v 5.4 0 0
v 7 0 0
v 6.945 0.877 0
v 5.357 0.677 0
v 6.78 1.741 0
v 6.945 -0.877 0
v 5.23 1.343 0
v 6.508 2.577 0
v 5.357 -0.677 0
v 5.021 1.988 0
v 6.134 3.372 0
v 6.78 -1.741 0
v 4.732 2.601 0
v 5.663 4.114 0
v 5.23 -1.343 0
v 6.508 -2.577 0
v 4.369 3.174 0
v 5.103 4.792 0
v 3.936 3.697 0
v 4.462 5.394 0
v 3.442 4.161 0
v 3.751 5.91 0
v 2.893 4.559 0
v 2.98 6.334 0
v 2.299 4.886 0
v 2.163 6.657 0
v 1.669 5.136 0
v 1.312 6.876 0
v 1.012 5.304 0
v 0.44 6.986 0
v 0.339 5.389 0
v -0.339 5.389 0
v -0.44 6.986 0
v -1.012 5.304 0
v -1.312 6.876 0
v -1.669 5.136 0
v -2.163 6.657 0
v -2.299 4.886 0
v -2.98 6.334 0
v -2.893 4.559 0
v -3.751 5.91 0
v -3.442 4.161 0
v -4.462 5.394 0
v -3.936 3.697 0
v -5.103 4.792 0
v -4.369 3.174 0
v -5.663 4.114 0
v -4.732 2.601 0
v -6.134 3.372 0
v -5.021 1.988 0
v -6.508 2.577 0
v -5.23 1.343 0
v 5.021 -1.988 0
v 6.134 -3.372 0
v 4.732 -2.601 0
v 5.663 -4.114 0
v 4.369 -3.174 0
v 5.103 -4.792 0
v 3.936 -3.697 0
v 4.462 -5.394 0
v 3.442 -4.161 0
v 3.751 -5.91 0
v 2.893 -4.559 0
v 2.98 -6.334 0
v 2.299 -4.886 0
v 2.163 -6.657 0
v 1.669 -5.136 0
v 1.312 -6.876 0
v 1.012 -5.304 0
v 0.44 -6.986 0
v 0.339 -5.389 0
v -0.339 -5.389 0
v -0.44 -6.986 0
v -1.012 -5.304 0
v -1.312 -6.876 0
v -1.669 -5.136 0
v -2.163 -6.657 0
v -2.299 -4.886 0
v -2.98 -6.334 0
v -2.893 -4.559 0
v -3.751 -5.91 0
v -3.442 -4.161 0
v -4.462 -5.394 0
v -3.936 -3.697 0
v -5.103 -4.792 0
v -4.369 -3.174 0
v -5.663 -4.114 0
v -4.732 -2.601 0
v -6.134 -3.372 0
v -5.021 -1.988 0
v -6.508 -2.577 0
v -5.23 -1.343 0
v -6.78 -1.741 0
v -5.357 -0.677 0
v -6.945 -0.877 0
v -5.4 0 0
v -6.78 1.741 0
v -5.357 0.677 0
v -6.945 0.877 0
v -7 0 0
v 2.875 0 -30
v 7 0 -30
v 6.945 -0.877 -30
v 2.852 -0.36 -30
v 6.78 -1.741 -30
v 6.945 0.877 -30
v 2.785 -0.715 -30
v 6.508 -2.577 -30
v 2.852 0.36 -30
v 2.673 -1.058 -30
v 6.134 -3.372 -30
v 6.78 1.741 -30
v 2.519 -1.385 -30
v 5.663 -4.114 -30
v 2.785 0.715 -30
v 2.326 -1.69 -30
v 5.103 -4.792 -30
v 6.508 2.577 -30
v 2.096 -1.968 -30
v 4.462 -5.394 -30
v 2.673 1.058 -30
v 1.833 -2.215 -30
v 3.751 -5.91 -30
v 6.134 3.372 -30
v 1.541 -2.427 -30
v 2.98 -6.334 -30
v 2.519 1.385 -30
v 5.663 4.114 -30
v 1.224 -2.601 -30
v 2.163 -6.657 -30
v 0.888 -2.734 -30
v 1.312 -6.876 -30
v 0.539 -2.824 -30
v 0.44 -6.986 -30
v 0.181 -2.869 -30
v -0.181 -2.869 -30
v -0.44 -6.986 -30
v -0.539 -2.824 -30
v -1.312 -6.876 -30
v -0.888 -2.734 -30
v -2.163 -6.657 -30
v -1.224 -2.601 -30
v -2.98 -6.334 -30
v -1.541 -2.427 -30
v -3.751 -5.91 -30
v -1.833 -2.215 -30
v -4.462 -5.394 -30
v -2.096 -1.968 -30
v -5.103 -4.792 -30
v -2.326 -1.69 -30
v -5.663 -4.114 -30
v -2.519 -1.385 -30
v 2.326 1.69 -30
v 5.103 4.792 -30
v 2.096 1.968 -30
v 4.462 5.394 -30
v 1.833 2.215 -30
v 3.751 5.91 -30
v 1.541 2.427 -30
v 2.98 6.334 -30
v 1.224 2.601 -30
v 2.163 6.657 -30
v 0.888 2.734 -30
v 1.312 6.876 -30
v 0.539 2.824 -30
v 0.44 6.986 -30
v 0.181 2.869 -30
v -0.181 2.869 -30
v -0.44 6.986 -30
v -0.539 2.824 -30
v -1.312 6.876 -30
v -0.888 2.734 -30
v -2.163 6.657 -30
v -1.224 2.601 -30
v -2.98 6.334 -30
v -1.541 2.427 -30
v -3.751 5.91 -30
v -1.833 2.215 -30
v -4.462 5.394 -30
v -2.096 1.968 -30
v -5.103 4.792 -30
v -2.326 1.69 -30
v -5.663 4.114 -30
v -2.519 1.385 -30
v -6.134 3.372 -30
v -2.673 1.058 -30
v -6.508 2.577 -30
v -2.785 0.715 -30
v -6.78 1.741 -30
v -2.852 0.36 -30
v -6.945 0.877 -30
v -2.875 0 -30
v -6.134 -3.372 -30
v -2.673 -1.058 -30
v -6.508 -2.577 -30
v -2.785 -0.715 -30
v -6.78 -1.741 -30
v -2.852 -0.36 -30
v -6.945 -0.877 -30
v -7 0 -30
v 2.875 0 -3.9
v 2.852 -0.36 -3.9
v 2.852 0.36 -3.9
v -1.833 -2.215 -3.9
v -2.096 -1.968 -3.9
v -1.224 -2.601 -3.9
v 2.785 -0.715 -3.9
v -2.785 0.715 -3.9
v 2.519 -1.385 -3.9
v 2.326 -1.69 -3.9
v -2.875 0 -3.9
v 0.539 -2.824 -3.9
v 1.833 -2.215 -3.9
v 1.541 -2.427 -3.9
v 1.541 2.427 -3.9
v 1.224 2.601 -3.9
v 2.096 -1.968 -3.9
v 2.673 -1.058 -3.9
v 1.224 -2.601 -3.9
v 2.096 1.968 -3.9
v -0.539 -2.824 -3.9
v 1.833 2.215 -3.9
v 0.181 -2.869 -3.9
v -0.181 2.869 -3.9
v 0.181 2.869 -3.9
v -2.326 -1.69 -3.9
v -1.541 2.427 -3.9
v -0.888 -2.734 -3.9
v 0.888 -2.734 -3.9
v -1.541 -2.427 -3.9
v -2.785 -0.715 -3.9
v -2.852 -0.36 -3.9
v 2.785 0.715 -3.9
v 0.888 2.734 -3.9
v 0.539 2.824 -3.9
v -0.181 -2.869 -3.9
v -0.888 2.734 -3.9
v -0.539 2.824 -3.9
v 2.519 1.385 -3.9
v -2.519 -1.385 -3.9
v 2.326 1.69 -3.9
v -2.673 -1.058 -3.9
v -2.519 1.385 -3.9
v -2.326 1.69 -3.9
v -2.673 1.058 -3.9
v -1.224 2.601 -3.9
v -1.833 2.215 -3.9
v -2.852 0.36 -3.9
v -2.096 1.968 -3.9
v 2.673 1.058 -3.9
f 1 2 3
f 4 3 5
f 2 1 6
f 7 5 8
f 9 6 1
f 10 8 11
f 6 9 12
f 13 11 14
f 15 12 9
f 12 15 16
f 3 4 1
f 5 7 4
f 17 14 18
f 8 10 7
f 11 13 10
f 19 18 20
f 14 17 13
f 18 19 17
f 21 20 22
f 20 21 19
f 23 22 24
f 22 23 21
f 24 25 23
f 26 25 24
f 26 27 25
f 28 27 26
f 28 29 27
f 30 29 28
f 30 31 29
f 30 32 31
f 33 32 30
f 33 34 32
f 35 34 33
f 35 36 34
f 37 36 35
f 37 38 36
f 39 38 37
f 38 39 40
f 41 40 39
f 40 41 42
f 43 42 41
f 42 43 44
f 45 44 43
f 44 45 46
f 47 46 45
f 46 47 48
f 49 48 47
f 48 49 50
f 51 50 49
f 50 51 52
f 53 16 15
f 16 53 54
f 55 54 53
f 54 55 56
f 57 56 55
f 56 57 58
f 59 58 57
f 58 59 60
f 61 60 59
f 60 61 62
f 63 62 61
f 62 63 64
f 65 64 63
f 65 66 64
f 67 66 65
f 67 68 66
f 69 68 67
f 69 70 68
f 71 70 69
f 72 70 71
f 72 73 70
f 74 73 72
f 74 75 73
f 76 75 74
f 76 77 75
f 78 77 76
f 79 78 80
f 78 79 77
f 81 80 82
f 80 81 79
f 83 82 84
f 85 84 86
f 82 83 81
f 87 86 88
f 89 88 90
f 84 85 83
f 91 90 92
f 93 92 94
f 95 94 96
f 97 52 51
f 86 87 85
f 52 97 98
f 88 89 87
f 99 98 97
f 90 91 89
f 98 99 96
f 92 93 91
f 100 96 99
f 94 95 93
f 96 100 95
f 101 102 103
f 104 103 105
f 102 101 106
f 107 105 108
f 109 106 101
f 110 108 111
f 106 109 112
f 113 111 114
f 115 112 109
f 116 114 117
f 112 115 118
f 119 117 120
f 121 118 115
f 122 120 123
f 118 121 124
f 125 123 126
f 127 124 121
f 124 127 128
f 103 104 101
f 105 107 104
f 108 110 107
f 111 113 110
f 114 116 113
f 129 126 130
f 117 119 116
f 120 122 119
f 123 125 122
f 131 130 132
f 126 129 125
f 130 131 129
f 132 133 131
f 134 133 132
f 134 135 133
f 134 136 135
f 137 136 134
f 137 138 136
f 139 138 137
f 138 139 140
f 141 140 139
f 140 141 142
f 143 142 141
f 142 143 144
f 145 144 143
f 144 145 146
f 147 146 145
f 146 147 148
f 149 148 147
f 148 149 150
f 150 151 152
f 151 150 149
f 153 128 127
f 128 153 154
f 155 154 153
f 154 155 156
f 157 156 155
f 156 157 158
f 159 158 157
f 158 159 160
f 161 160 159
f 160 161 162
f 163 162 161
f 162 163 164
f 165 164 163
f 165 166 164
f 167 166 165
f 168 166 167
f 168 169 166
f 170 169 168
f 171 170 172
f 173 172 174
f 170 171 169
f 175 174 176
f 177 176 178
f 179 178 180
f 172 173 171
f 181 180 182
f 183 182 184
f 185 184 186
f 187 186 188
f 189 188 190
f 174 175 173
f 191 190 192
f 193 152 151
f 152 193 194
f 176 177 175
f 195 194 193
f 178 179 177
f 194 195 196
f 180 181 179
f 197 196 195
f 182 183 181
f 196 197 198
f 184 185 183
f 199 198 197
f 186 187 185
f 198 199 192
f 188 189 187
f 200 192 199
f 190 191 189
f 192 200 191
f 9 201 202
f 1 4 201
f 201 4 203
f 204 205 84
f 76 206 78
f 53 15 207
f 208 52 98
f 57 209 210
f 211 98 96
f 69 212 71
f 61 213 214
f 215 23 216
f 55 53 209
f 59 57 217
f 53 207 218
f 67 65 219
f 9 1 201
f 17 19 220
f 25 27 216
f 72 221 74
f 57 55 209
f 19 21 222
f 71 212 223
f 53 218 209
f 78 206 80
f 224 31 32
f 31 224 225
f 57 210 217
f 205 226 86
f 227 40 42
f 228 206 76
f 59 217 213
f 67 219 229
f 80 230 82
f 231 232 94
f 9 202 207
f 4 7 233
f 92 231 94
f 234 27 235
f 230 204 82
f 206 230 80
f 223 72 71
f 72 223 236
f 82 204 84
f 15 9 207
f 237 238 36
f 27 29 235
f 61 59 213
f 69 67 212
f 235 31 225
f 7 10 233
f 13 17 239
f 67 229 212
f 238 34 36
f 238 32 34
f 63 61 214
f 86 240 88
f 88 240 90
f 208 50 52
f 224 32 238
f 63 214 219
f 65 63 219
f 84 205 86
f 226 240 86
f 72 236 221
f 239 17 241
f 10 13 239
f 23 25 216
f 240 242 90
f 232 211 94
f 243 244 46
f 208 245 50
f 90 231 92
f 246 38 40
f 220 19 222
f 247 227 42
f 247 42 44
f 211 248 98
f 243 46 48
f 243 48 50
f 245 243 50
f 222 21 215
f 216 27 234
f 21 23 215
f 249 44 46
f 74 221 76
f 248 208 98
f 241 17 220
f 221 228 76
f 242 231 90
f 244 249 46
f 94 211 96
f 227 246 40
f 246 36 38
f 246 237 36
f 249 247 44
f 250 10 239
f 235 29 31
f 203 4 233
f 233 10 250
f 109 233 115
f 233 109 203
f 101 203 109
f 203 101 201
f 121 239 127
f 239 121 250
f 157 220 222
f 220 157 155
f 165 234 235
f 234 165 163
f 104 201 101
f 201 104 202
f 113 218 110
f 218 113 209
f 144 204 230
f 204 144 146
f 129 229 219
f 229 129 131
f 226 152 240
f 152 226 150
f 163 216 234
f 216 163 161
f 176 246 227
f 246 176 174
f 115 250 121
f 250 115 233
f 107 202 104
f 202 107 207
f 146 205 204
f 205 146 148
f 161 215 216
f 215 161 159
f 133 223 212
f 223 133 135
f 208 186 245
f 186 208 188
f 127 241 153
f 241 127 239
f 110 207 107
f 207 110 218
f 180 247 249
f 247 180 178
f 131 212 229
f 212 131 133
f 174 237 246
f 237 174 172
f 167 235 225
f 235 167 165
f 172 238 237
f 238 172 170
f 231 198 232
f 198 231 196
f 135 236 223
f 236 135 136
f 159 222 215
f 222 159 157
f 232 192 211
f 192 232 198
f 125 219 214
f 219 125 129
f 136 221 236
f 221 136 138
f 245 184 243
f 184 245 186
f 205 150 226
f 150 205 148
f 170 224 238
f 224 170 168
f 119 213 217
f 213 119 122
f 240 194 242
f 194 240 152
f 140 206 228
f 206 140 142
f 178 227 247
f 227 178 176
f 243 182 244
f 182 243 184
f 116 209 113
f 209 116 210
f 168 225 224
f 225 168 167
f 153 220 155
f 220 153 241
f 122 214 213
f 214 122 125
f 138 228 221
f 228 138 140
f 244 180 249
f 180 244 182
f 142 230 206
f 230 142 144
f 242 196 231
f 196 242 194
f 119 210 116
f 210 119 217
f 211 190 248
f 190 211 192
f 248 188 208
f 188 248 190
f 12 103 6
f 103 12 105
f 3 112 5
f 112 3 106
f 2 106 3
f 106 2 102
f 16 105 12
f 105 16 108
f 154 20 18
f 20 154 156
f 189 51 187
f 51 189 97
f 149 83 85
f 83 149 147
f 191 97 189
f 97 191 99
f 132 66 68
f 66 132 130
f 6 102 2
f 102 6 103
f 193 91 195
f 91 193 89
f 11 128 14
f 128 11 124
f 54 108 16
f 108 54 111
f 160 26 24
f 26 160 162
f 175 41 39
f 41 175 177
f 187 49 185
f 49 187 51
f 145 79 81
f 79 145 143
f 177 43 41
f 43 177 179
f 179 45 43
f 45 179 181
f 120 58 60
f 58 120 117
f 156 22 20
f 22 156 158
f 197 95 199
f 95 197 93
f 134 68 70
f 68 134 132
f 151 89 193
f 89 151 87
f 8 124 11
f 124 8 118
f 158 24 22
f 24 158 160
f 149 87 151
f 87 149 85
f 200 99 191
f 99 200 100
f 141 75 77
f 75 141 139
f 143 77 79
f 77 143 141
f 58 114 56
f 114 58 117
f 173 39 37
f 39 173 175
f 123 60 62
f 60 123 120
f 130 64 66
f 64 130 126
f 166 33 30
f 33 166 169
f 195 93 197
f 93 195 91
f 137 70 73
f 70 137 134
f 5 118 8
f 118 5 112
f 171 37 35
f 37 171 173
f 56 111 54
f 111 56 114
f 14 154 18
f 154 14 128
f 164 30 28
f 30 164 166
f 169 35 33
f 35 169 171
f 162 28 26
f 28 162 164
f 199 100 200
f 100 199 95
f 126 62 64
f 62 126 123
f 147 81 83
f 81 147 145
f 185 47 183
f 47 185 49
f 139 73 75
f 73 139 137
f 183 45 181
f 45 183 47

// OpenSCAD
$fn = 50;


difference() {
	union() {
		translate(v = [0, 0, -30.0000000000]) {
			cylinder(h = 30, r = 7.0000000000);
		}
		cylinder(h = 0, r = 17.0000000000);
	}
	union() {
		translate(v = [0, 0, 0]) {
			rotate(a = [0, 0, 0]) {
				difference() {
					union() {
						#translate(v = [0, 0, -30.0000000000]) {
							cylinder(h = 30, r = 2.6000000000);
						}
						#translate(v = [0, 0, -3.9000000000]) {
							cylinder(h = 3.9000000000, r1 = 2.8750000000, r2 = 5.4000000000);
						}
						#translate(v = [0, 0, -30.0000000000]) {
							cylinder(h = 30, r = 2.8750000000);
						}
						#translate(v = [0, 0, -30.0000000000]) {
							cylinder(h = 30, r = 2.6000000000);
						}
					}
					union();
				}
			}
		}
	}
}
